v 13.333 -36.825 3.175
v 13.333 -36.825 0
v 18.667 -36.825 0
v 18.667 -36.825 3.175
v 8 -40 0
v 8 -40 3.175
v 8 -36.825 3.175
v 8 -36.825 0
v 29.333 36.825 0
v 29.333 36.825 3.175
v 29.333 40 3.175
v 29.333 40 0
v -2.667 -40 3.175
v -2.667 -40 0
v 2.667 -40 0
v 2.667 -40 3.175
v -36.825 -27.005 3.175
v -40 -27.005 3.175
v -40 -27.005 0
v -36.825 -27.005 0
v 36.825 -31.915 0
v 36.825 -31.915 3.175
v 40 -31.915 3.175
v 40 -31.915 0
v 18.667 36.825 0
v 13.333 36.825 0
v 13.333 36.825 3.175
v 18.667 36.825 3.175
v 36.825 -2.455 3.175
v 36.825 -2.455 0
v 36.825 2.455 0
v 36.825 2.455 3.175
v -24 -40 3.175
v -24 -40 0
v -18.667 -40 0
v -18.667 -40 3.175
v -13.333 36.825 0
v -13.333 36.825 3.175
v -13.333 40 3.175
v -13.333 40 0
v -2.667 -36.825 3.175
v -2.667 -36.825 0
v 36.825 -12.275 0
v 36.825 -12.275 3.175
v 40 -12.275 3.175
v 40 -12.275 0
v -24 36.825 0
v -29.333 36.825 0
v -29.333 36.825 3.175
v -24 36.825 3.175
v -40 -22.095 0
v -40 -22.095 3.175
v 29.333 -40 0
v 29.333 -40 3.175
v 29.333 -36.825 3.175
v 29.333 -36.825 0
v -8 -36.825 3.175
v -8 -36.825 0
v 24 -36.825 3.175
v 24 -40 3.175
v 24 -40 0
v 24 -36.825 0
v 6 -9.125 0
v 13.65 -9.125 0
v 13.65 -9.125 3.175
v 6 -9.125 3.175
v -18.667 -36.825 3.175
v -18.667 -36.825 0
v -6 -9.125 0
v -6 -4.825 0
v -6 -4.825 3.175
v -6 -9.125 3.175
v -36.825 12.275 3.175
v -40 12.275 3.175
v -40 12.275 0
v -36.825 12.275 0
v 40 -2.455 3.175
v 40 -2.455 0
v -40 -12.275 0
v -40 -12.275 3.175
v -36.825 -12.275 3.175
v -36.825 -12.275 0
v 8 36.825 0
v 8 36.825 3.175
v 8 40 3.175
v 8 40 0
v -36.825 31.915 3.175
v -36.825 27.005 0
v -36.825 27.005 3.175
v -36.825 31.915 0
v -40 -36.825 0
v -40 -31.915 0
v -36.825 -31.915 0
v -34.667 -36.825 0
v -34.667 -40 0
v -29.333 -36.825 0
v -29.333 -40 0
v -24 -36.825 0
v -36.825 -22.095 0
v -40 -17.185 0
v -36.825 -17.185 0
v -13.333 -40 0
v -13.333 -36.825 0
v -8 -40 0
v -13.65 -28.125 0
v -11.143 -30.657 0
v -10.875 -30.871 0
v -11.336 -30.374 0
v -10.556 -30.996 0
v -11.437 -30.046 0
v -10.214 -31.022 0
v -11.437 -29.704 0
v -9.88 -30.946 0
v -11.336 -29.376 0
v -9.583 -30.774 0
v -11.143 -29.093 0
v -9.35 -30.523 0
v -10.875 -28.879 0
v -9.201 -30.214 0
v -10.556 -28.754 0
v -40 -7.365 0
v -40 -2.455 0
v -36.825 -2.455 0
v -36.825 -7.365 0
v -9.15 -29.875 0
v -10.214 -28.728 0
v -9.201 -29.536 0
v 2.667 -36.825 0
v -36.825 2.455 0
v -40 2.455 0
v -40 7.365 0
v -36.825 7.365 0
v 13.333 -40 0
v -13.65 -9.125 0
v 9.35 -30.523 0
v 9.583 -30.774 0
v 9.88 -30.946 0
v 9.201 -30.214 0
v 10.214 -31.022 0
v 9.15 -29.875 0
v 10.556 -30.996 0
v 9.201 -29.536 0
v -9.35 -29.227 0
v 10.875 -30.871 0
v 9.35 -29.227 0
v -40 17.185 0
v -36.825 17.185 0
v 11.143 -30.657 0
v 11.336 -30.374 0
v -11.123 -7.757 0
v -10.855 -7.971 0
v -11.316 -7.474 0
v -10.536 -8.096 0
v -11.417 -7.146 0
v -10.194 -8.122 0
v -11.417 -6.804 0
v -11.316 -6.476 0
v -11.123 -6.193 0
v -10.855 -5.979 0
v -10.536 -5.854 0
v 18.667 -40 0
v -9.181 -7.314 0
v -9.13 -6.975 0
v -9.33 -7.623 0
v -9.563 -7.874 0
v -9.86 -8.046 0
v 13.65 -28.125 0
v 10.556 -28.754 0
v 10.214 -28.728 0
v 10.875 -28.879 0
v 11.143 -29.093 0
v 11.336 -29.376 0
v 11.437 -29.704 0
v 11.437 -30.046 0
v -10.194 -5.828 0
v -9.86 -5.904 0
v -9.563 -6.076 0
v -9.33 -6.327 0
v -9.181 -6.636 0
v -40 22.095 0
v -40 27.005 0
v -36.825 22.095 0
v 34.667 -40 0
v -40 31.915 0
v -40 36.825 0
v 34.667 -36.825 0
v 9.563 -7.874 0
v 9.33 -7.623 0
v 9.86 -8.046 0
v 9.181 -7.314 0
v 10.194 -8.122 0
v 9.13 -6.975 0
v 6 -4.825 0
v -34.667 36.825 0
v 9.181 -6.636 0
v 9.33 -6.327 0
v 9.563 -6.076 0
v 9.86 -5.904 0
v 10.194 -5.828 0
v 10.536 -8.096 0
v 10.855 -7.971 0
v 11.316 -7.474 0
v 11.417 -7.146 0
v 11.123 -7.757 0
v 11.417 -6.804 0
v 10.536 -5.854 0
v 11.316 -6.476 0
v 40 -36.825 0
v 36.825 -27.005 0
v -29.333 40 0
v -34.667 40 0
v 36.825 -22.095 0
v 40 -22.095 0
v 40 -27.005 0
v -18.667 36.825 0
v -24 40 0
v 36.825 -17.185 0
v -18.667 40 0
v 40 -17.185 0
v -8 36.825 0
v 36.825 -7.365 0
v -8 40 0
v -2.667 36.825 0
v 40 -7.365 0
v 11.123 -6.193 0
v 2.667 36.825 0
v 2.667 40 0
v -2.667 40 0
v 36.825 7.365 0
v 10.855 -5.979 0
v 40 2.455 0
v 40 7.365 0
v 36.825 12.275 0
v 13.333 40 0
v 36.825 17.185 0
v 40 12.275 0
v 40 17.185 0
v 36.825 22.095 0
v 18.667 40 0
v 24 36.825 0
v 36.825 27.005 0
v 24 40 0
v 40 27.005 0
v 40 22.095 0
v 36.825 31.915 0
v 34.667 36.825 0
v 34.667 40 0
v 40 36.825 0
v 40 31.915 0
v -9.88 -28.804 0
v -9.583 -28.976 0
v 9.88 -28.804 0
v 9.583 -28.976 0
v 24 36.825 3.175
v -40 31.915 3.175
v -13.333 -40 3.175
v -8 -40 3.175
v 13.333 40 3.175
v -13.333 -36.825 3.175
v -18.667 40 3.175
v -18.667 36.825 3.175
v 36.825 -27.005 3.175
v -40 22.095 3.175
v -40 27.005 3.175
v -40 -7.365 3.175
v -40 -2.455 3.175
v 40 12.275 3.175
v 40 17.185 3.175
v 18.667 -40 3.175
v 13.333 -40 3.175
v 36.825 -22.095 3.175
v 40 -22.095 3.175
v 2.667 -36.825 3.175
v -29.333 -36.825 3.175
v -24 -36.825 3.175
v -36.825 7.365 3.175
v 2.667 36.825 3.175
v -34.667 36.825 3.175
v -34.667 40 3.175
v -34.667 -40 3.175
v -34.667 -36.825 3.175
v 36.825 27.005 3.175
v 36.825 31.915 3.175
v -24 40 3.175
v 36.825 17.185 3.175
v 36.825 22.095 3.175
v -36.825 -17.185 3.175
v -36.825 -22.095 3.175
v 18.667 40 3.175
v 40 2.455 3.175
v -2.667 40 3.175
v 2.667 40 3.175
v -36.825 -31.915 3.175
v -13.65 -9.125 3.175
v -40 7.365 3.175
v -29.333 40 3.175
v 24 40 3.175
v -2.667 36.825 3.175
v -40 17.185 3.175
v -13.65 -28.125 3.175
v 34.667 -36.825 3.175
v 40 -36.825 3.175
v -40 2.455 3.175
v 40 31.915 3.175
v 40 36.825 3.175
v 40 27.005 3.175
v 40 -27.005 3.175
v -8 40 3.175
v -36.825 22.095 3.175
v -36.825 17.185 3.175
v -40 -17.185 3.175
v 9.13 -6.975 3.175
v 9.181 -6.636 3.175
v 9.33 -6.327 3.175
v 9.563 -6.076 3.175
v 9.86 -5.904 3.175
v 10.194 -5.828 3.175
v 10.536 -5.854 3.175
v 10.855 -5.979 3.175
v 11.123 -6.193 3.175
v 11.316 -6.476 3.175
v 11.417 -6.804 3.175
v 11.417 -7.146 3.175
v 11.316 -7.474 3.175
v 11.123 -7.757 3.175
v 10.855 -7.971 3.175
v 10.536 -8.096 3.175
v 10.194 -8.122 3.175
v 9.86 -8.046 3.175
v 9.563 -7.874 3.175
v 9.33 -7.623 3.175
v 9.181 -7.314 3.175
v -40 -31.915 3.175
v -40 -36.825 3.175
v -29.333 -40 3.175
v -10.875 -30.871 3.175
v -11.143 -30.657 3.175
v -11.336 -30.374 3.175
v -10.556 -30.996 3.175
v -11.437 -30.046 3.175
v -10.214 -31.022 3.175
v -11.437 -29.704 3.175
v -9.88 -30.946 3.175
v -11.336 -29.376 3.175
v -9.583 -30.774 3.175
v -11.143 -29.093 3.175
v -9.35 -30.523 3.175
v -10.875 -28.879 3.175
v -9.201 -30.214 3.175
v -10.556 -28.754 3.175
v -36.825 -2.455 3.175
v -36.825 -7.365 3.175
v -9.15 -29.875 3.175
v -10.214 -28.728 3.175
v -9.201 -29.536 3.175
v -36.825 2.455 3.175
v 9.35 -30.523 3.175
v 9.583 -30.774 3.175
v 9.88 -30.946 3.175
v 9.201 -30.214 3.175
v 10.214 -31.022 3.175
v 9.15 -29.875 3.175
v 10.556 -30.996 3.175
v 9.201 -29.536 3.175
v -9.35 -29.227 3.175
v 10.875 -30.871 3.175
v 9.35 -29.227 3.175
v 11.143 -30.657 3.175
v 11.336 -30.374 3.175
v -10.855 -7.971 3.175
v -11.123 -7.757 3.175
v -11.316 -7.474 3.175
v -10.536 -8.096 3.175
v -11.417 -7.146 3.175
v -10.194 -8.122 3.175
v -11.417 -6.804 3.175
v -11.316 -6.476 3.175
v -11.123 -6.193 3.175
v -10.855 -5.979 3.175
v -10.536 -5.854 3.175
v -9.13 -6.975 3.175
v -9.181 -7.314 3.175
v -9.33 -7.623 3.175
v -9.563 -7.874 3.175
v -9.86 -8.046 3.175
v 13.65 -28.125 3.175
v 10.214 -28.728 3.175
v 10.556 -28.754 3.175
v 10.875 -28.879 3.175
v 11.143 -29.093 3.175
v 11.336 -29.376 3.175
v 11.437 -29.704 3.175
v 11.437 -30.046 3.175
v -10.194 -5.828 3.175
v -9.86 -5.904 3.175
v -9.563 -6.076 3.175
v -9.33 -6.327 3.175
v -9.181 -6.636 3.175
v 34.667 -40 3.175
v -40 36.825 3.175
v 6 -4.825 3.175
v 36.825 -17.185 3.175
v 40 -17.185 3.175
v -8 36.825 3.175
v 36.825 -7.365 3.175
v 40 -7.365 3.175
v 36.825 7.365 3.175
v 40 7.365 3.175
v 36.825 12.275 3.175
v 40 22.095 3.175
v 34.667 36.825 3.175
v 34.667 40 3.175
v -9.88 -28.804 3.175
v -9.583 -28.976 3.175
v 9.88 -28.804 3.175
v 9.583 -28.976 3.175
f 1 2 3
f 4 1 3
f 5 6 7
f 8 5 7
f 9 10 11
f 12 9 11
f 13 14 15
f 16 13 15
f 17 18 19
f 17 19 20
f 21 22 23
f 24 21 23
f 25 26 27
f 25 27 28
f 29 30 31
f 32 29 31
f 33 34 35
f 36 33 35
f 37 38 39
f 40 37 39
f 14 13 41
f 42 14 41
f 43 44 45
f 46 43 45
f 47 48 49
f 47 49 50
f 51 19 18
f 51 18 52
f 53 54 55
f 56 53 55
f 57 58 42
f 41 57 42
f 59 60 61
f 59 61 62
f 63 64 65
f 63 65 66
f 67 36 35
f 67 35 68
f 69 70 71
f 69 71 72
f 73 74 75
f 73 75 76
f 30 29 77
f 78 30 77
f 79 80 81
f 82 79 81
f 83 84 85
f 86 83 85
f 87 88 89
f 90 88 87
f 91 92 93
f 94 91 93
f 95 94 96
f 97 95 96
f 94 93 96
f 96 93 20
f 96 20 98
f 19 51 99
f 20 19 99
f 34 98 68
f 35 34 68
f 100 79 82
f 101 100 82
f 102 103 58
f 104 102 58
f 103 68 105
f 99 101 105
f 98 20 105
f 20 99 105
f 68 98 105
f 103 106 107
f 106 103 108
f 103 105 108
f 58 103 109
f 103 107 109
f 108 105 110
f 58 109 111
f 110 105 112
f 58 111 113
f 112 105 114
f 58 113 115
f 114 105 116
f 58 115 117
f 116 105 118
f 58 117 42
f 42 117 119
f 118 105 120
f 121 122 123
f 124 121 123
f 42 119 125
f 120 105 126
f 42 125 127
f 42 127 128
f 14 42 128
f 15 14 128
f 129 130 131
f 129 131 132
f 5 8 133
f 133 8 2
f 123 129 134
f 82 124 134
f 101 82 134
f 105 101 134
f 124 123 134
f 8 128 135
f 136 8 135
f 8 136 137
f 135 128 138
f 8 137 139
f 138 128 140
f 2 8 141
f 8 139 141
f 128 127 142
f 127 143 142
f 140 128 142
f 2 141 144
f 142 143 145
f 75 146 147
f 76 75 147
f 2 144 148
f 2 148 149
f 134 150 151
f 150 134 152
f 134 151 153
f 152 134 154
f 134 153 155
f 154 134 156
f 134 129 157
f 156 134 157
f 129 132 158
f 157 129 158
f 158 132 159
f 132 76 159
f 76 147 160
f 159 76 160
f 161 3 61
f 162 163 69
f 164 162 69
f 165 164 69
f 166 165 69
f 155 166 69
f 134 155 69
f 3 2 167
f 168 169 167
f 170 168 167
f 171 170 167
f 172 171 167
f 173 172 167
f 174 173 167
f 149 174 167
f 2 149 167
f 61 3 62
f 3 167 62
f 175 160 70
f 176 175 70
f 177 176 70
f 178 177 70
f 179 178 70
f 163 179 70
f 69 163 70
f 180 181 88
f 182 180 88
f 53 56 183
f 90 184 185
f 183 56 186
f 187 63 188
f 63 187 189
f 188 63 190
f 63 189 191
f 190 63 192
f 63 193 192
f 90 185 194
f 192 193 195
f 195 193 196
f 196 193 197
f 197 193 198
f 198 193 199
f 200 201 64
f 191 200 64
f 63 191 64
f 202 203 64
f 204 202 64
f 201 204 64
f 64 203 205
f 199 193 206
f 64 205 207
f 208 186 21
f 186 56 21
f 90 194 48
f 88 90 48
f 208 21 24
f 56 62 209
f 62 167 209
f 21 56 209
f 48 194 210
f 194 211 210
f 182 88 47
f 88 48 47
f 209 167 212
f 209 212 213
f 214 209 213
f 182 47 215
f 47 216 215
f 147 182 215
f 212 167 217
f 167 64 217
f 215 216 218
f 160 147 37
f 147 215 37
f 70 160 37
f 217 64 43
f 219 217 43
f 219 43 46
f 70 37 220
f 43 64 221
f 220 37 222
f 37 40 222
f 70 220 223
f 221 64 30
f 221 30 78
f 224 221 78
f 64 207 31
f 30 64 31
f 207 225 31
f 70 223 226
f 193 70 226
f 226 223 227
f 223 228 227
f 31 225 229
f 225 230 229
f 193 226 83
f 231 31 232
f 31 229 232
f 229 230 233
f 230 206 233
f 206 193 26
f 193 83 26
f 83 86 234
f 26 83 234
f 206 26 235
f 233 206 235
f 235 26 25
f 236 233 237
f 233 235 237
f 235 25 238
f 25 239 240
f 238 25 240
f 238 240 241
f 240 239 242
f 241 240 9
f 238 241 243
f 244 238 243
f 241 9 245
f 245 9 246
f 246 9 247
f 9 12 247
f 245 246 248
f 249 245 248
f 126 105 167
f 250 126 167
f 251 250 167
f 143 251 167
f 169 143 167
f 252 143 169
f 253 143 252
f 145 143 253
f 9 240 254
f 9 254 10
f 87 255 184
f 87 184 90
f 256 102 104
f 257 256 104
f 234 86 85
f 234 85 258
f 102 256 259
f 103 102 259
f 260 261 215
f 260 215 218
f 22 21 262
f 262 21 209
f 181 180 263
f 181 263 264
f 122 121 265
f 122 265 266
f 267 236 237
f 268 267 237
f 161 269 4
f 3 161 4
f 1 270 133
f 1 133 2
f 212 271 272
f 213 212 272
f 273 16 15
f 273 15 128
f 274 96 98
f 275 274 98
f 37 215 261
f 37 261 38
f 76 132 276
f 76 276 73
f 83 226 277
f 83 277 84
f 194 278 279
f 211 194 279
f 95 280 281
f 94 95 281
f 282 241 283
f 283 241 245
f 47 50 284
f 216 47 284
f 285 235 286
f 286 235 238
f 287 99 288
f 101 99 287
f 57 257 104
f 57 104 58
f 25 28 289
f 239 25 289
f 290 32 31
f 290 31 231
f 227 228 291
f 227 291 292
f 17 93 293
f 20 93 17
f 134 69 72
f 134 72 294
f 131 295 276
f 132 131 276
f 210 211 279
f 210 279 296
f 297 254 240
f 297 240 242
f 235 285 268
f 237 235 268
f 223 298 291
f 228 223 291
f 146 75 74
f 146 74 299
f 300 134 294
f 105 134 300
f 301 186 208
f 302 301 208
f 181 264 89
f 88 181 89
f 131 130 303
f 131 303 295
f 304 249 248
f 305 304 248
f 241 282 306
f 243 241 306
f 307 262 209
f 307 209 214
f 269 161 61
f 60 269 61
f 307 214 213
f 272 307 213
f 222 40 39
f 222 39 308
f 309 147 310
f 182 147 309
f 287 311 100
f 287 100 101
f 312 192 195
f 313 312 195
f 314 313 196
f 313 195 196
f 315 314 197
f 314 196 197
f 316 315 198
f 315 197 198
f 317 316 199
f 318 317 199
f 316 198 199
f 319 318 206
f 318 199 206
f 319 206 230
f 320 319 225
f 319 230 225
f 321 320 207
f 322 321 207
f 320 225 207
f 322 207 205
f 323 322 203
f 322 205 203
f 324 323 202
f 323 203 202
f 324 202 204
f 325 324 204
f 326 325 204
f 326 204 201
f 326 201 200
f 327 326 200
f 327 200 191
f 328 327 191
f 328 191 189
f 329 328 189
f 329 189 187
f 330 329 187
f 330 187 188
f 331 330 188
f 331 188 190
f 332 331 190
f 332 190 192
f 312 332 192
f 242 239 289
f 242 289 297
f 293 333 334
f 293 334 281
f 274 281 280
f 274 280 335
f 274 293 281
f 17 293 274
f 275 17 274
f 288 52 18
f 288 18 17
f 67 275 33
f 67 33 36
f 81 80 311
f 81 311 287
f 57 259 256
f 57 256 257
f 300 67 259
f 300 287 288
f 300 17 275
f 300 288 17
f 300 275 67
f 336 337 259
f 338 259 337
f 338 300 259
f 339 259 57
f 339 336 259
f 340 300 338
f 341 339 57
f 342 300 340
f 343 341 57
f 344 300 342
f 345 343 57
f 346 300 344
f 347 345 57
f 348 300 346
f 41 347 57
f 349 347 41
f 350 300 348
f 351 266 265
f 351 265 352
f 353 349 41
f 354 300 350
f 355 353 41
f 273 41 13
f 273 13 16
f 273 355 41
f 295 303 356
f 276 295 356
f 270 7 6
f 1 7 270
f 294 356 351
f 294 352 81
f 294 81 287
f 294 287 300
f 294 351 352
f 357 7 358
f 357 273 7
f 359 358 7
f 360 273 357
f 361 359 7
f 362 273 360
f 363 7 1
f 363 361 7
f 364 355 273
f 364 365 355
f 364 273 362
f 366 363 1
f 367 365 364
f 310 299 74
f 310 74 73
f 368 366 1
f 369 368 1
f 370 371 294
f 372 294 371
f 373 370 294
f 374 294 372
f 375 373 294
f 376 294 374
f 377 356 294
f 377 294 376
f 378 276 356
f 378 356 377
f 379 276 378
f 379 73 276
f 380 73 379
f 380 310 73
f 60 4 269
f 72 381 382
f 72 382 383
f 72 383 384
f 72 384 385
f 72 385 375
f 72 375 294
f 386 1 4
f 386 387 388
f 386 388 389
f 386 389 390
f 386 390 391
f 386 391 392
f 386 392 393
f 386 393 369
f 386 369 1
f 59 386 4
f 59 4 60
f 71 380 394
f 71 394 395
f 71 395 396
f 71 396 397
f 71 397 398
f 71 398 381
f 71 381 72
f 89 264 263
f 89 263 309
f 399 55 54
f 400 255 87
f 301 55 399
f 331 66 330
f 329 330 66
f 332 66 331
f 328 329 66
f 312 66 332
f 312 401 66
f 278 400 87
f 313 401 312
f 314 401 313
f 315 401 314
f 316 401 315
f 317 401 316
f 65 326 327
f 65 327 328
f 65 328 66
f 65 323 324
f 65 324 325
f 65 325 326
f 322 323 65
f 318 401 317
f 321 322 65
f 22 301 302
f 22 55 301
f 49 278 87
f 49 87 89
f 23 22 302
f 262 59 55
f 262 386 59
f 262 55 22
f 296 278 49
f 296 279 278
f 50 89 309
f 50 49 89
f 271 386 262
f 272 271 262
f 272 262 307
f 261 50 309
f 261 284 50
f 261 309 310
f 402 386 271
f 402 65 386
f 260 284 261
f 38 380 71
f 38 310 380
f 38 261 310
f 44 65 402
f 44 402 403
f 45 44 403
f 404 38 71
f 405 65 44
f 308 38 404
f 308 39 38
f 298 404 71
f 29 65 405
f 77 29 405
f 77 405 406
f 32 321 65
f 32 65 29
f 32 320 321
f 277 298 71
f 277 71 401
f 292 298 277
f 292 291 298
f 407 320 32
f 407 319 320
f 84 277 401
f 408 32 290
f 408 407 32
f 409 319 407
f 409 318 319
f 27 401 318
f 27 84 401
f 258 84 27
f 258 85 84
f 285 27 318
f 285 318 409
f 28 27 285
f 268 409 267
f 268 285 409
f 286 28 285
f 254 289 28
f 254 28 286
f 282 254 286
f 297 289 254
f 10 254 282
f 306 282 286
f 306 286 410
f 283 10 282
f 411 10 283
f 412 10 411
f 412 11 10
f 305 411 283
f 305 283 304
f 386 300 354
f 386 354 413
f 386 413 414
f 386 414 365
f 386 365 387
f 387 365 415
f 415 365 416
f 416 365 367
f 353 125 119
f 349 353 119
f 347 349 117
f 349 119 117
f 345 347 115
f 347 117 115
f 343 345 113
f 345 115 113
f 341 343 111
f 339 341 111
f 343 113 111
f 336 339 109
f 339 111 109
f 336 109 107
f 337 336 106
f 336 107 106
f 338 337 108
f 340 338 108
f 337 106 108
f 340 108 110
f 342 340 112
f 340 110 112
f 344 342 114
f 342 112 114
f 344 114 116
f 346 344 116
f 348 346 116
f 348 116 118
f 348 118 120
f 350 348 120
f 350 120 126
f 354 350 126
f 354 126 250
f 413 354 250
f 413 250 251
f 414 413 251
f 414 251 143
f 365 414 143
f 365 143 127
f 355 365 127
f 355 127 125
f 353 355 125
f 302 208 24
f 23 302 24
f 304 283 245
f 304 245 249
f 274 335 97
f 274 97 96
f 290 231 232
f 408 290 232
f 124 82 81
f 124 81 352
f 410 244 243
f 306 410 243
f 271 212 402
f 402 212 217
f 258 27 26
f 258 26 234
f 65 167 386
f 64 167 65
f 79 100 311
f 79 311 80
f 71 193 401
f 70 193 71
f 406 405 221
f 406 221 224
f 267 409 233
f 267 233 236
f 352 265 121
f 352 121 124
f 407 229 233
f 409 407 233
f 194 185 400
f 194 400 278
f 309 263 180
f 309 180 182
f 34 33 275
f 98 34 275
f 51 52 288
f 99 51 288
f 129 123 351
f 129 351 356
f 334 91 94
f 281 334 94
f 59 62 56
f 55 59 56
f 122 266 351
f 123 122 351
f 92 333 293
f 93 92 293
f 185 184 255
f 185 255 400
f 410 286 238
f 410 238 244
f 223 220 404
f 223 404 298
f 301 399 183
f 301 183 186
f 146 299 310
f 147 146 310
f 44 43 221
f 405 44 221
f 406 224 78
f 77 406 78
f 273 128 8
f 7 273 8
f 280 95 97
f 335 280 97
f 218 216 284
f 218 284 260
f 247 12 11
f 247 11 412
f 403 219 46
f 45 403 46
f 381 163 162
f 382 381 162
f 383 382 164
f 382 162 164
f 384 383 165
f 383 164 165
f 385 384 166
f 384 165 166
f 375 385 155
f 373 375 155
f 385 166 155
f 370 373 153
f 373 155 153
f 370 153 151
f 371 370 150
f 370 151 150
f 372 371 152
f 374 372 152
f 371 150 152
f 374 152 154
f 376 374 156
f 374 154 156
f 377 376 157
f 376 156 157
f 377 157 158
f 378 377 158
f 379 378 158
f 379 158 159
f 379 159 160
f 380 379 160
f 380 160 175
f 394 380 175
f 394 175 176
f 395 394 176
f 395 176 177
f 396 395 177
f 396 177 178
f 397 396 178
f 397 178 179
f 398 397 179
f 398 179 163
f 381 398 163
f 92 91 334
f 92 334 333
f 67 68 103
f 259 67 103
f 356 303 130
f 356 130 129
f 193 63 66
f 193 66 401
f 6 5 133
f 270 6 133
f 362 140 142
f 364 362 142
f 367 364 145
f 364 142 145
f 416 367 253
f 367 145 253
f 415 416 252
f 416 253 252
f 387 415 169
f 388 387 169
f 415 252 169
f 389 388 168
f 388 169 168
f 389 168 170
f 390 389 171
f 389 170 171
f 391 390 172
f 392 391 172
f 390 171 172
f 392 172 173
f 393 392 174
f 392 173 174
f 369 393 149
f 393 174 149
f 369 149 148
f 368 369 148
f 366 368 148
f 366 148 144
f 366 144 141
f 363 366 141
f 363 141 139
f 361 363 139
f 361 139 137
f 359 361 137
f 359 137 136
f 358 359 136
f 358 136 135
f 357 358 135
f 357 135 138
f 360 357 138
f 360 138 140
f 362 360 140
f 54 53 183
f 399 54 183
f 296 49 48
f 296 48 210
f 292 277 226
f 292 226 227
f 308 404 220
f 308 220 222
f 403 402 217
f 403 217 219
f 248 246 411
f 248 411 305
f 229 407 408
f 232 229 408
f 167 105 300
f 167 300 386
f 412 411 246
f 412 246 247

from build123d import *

# Parameters (mm, degrees)
SKETCH1_W           = 80
SKETCH1_H           = 80
BOSS_EXTRUDE1_DEPTH = 3.175
SKETCH2_OUTSIDE_W   = 104.636
SKETCH2_OUTSIDE_H   = 104.636
CUT_EXTRUDE1_DEPTH  = 57.657573413
SKETCH3_R           = 1.15
CUT_EXTRUDE2_DEPTH  = 57.657573413


with BuildPart() as part:
    # Sketch1 → Boss-Extrude1 (new body)
    with BuildSketch(Plane.XY):
        Rectangle(SKETCH1_W, SKETCH1_H)
    extrude(amount=BOSS_EXTRUDE1_DEPTH)

    # Sketch2 outside → Cut-Extrude1 (cut, through all)
    with BuildSketch(Plane.XY.offset(3.175)):
        Rectangle(SKETCH2_OUTSIDE_W, SKETCH2_OUTSIDE_H)
        Polygon((-40, -31.915), (-40, -36.825), (-34.666666667, -36.825), (-34.666666667, -40), (-29.333333333, -40), (-29.333333333, -36.825), (-24, -36.825), (-24, -40), (-18.666666667, -40), (-18.666666667, -36.825), (-13.333333333, -36.825), (-13.333333333, -40), (-8, -40), (-8, -36.825), (-2.666666667, -36.825), (-2.666666667, -40), (2.666666667, -40), (2.666666667, -36.825), (8, -36.825), (8, -40), (13.333333333, -40), (13.333333333, -36.825), (18.666666667, -36.825), (18.666666667, -40), (24, -40), (24, -36.825), (29.333333333, -36.825), (29.333333333, -40), (34.666666667, -40), (34.666666667, -36.825), (40, -36.825), (40, -31.915), (36.825, -31.915), (36.825, -27.005), (40, -27.005), (40, -22.095), (36.825, -22.095), (36.825, -17.185), (40, -17.185), (40, -12.275), (36.825, -12.275), (36.825, -7.365), (40, -7.365), (40, -2.455), (36.825, -2.455), (36.825, 2.455), (40, 2.455), (40, 7.365), (36.825, 7.365), (36.825, 12.275), (40, 12.275), (40, 17.185), (36.825, 17.185), (36.825, 22.095), (40, 22.095), (40, 27.005), (36.825, 27.005), (36.825, 31.915), (40, 31.915), (40, 36.825), (34.666666667, 36.825), (34.666666667, 40), (29.333333333, 40), (29.333333333, 36.825), (24, 36.825), (24, 40), (18.666666667, 40), (18.666666667, 36.825), (13.333333333, 36.825), (13.333333333, 40), (8, 40), (8, 36.825), (2.666666667, 36.825), (2.666666667, 40), (-2.666666667, 40), (-2.666666667, 36.825), (-8, 36.825), (-8, 40), (-13.333333333, 40), (-13.333333333, 36.825), (-18.666666667, 36.825), (-18.666666667, 40), (-24, 40), (-24, 36.825), (-29.333333333, 36.825), (-29.333333333, 40), (-34.666666667, 40), (-34.666666667, 36.825), (-40, 36.825), (-40, 31.915), (-36.825, 31.915), (-36.825, 27.005), (-40, 27.005), (-40, 22.095), (-36.825, 22.095), (-36.825, 17.185), (-40, 17.185), (-40, 12.275), (-36.825, 12.275), (-36.825, 7.365), (-40, 7.365), (-40, 2.455), (-36.825, 2.455), (-36.825, -2.455), (-40, -2.455), (-40, -7.365), (-36.825, -7.365), (-36.825, -12.275), (-40, -12.275), (-40, -17.185), (-36.825, -17.185), (-36.825, -22.095), (-40, -22.095), (-40, -27.005), (-36.825, -27.005), (-36.825, -31.915), align=None, mode=Mode.SUBTRACT)
    extrude(amount=-CUT_EXTRUDE1_DEPTH, mode=Mode.SUBTRACT)

    # Sketch3 → Cut-Extrude2 (cut, through all)
    with BuildSketch(Plane(origin=(0, 0, 0), x_dir=(-1, 0, 0), z_dir=(0, 0, -1))):
        with Locations((-10.28, -6.975)):
            Circle(SKETCH3_R)
        with Locations((-10.3, -29.875)):
            Circle(SKETCH3_R)
        with Locations((10.3, -29.875)):
            Circle(SKETCH3_R)
        with Locations((10.28, -6.975)):
            Circle(SKETCH3_R)
        Polygon((6, -4.825), (6, -9.125), (13.65, -9.125), (13.65, -28.125), (-13.65, -28.125), (-13.65, -9.125), (-6, -9.125), (-6, -4.825), align=None)
    extrude(amount=-CUT_EXTRUDE2_DEPTH, mode=Mode.SUBTRACT)


solid = part.part
